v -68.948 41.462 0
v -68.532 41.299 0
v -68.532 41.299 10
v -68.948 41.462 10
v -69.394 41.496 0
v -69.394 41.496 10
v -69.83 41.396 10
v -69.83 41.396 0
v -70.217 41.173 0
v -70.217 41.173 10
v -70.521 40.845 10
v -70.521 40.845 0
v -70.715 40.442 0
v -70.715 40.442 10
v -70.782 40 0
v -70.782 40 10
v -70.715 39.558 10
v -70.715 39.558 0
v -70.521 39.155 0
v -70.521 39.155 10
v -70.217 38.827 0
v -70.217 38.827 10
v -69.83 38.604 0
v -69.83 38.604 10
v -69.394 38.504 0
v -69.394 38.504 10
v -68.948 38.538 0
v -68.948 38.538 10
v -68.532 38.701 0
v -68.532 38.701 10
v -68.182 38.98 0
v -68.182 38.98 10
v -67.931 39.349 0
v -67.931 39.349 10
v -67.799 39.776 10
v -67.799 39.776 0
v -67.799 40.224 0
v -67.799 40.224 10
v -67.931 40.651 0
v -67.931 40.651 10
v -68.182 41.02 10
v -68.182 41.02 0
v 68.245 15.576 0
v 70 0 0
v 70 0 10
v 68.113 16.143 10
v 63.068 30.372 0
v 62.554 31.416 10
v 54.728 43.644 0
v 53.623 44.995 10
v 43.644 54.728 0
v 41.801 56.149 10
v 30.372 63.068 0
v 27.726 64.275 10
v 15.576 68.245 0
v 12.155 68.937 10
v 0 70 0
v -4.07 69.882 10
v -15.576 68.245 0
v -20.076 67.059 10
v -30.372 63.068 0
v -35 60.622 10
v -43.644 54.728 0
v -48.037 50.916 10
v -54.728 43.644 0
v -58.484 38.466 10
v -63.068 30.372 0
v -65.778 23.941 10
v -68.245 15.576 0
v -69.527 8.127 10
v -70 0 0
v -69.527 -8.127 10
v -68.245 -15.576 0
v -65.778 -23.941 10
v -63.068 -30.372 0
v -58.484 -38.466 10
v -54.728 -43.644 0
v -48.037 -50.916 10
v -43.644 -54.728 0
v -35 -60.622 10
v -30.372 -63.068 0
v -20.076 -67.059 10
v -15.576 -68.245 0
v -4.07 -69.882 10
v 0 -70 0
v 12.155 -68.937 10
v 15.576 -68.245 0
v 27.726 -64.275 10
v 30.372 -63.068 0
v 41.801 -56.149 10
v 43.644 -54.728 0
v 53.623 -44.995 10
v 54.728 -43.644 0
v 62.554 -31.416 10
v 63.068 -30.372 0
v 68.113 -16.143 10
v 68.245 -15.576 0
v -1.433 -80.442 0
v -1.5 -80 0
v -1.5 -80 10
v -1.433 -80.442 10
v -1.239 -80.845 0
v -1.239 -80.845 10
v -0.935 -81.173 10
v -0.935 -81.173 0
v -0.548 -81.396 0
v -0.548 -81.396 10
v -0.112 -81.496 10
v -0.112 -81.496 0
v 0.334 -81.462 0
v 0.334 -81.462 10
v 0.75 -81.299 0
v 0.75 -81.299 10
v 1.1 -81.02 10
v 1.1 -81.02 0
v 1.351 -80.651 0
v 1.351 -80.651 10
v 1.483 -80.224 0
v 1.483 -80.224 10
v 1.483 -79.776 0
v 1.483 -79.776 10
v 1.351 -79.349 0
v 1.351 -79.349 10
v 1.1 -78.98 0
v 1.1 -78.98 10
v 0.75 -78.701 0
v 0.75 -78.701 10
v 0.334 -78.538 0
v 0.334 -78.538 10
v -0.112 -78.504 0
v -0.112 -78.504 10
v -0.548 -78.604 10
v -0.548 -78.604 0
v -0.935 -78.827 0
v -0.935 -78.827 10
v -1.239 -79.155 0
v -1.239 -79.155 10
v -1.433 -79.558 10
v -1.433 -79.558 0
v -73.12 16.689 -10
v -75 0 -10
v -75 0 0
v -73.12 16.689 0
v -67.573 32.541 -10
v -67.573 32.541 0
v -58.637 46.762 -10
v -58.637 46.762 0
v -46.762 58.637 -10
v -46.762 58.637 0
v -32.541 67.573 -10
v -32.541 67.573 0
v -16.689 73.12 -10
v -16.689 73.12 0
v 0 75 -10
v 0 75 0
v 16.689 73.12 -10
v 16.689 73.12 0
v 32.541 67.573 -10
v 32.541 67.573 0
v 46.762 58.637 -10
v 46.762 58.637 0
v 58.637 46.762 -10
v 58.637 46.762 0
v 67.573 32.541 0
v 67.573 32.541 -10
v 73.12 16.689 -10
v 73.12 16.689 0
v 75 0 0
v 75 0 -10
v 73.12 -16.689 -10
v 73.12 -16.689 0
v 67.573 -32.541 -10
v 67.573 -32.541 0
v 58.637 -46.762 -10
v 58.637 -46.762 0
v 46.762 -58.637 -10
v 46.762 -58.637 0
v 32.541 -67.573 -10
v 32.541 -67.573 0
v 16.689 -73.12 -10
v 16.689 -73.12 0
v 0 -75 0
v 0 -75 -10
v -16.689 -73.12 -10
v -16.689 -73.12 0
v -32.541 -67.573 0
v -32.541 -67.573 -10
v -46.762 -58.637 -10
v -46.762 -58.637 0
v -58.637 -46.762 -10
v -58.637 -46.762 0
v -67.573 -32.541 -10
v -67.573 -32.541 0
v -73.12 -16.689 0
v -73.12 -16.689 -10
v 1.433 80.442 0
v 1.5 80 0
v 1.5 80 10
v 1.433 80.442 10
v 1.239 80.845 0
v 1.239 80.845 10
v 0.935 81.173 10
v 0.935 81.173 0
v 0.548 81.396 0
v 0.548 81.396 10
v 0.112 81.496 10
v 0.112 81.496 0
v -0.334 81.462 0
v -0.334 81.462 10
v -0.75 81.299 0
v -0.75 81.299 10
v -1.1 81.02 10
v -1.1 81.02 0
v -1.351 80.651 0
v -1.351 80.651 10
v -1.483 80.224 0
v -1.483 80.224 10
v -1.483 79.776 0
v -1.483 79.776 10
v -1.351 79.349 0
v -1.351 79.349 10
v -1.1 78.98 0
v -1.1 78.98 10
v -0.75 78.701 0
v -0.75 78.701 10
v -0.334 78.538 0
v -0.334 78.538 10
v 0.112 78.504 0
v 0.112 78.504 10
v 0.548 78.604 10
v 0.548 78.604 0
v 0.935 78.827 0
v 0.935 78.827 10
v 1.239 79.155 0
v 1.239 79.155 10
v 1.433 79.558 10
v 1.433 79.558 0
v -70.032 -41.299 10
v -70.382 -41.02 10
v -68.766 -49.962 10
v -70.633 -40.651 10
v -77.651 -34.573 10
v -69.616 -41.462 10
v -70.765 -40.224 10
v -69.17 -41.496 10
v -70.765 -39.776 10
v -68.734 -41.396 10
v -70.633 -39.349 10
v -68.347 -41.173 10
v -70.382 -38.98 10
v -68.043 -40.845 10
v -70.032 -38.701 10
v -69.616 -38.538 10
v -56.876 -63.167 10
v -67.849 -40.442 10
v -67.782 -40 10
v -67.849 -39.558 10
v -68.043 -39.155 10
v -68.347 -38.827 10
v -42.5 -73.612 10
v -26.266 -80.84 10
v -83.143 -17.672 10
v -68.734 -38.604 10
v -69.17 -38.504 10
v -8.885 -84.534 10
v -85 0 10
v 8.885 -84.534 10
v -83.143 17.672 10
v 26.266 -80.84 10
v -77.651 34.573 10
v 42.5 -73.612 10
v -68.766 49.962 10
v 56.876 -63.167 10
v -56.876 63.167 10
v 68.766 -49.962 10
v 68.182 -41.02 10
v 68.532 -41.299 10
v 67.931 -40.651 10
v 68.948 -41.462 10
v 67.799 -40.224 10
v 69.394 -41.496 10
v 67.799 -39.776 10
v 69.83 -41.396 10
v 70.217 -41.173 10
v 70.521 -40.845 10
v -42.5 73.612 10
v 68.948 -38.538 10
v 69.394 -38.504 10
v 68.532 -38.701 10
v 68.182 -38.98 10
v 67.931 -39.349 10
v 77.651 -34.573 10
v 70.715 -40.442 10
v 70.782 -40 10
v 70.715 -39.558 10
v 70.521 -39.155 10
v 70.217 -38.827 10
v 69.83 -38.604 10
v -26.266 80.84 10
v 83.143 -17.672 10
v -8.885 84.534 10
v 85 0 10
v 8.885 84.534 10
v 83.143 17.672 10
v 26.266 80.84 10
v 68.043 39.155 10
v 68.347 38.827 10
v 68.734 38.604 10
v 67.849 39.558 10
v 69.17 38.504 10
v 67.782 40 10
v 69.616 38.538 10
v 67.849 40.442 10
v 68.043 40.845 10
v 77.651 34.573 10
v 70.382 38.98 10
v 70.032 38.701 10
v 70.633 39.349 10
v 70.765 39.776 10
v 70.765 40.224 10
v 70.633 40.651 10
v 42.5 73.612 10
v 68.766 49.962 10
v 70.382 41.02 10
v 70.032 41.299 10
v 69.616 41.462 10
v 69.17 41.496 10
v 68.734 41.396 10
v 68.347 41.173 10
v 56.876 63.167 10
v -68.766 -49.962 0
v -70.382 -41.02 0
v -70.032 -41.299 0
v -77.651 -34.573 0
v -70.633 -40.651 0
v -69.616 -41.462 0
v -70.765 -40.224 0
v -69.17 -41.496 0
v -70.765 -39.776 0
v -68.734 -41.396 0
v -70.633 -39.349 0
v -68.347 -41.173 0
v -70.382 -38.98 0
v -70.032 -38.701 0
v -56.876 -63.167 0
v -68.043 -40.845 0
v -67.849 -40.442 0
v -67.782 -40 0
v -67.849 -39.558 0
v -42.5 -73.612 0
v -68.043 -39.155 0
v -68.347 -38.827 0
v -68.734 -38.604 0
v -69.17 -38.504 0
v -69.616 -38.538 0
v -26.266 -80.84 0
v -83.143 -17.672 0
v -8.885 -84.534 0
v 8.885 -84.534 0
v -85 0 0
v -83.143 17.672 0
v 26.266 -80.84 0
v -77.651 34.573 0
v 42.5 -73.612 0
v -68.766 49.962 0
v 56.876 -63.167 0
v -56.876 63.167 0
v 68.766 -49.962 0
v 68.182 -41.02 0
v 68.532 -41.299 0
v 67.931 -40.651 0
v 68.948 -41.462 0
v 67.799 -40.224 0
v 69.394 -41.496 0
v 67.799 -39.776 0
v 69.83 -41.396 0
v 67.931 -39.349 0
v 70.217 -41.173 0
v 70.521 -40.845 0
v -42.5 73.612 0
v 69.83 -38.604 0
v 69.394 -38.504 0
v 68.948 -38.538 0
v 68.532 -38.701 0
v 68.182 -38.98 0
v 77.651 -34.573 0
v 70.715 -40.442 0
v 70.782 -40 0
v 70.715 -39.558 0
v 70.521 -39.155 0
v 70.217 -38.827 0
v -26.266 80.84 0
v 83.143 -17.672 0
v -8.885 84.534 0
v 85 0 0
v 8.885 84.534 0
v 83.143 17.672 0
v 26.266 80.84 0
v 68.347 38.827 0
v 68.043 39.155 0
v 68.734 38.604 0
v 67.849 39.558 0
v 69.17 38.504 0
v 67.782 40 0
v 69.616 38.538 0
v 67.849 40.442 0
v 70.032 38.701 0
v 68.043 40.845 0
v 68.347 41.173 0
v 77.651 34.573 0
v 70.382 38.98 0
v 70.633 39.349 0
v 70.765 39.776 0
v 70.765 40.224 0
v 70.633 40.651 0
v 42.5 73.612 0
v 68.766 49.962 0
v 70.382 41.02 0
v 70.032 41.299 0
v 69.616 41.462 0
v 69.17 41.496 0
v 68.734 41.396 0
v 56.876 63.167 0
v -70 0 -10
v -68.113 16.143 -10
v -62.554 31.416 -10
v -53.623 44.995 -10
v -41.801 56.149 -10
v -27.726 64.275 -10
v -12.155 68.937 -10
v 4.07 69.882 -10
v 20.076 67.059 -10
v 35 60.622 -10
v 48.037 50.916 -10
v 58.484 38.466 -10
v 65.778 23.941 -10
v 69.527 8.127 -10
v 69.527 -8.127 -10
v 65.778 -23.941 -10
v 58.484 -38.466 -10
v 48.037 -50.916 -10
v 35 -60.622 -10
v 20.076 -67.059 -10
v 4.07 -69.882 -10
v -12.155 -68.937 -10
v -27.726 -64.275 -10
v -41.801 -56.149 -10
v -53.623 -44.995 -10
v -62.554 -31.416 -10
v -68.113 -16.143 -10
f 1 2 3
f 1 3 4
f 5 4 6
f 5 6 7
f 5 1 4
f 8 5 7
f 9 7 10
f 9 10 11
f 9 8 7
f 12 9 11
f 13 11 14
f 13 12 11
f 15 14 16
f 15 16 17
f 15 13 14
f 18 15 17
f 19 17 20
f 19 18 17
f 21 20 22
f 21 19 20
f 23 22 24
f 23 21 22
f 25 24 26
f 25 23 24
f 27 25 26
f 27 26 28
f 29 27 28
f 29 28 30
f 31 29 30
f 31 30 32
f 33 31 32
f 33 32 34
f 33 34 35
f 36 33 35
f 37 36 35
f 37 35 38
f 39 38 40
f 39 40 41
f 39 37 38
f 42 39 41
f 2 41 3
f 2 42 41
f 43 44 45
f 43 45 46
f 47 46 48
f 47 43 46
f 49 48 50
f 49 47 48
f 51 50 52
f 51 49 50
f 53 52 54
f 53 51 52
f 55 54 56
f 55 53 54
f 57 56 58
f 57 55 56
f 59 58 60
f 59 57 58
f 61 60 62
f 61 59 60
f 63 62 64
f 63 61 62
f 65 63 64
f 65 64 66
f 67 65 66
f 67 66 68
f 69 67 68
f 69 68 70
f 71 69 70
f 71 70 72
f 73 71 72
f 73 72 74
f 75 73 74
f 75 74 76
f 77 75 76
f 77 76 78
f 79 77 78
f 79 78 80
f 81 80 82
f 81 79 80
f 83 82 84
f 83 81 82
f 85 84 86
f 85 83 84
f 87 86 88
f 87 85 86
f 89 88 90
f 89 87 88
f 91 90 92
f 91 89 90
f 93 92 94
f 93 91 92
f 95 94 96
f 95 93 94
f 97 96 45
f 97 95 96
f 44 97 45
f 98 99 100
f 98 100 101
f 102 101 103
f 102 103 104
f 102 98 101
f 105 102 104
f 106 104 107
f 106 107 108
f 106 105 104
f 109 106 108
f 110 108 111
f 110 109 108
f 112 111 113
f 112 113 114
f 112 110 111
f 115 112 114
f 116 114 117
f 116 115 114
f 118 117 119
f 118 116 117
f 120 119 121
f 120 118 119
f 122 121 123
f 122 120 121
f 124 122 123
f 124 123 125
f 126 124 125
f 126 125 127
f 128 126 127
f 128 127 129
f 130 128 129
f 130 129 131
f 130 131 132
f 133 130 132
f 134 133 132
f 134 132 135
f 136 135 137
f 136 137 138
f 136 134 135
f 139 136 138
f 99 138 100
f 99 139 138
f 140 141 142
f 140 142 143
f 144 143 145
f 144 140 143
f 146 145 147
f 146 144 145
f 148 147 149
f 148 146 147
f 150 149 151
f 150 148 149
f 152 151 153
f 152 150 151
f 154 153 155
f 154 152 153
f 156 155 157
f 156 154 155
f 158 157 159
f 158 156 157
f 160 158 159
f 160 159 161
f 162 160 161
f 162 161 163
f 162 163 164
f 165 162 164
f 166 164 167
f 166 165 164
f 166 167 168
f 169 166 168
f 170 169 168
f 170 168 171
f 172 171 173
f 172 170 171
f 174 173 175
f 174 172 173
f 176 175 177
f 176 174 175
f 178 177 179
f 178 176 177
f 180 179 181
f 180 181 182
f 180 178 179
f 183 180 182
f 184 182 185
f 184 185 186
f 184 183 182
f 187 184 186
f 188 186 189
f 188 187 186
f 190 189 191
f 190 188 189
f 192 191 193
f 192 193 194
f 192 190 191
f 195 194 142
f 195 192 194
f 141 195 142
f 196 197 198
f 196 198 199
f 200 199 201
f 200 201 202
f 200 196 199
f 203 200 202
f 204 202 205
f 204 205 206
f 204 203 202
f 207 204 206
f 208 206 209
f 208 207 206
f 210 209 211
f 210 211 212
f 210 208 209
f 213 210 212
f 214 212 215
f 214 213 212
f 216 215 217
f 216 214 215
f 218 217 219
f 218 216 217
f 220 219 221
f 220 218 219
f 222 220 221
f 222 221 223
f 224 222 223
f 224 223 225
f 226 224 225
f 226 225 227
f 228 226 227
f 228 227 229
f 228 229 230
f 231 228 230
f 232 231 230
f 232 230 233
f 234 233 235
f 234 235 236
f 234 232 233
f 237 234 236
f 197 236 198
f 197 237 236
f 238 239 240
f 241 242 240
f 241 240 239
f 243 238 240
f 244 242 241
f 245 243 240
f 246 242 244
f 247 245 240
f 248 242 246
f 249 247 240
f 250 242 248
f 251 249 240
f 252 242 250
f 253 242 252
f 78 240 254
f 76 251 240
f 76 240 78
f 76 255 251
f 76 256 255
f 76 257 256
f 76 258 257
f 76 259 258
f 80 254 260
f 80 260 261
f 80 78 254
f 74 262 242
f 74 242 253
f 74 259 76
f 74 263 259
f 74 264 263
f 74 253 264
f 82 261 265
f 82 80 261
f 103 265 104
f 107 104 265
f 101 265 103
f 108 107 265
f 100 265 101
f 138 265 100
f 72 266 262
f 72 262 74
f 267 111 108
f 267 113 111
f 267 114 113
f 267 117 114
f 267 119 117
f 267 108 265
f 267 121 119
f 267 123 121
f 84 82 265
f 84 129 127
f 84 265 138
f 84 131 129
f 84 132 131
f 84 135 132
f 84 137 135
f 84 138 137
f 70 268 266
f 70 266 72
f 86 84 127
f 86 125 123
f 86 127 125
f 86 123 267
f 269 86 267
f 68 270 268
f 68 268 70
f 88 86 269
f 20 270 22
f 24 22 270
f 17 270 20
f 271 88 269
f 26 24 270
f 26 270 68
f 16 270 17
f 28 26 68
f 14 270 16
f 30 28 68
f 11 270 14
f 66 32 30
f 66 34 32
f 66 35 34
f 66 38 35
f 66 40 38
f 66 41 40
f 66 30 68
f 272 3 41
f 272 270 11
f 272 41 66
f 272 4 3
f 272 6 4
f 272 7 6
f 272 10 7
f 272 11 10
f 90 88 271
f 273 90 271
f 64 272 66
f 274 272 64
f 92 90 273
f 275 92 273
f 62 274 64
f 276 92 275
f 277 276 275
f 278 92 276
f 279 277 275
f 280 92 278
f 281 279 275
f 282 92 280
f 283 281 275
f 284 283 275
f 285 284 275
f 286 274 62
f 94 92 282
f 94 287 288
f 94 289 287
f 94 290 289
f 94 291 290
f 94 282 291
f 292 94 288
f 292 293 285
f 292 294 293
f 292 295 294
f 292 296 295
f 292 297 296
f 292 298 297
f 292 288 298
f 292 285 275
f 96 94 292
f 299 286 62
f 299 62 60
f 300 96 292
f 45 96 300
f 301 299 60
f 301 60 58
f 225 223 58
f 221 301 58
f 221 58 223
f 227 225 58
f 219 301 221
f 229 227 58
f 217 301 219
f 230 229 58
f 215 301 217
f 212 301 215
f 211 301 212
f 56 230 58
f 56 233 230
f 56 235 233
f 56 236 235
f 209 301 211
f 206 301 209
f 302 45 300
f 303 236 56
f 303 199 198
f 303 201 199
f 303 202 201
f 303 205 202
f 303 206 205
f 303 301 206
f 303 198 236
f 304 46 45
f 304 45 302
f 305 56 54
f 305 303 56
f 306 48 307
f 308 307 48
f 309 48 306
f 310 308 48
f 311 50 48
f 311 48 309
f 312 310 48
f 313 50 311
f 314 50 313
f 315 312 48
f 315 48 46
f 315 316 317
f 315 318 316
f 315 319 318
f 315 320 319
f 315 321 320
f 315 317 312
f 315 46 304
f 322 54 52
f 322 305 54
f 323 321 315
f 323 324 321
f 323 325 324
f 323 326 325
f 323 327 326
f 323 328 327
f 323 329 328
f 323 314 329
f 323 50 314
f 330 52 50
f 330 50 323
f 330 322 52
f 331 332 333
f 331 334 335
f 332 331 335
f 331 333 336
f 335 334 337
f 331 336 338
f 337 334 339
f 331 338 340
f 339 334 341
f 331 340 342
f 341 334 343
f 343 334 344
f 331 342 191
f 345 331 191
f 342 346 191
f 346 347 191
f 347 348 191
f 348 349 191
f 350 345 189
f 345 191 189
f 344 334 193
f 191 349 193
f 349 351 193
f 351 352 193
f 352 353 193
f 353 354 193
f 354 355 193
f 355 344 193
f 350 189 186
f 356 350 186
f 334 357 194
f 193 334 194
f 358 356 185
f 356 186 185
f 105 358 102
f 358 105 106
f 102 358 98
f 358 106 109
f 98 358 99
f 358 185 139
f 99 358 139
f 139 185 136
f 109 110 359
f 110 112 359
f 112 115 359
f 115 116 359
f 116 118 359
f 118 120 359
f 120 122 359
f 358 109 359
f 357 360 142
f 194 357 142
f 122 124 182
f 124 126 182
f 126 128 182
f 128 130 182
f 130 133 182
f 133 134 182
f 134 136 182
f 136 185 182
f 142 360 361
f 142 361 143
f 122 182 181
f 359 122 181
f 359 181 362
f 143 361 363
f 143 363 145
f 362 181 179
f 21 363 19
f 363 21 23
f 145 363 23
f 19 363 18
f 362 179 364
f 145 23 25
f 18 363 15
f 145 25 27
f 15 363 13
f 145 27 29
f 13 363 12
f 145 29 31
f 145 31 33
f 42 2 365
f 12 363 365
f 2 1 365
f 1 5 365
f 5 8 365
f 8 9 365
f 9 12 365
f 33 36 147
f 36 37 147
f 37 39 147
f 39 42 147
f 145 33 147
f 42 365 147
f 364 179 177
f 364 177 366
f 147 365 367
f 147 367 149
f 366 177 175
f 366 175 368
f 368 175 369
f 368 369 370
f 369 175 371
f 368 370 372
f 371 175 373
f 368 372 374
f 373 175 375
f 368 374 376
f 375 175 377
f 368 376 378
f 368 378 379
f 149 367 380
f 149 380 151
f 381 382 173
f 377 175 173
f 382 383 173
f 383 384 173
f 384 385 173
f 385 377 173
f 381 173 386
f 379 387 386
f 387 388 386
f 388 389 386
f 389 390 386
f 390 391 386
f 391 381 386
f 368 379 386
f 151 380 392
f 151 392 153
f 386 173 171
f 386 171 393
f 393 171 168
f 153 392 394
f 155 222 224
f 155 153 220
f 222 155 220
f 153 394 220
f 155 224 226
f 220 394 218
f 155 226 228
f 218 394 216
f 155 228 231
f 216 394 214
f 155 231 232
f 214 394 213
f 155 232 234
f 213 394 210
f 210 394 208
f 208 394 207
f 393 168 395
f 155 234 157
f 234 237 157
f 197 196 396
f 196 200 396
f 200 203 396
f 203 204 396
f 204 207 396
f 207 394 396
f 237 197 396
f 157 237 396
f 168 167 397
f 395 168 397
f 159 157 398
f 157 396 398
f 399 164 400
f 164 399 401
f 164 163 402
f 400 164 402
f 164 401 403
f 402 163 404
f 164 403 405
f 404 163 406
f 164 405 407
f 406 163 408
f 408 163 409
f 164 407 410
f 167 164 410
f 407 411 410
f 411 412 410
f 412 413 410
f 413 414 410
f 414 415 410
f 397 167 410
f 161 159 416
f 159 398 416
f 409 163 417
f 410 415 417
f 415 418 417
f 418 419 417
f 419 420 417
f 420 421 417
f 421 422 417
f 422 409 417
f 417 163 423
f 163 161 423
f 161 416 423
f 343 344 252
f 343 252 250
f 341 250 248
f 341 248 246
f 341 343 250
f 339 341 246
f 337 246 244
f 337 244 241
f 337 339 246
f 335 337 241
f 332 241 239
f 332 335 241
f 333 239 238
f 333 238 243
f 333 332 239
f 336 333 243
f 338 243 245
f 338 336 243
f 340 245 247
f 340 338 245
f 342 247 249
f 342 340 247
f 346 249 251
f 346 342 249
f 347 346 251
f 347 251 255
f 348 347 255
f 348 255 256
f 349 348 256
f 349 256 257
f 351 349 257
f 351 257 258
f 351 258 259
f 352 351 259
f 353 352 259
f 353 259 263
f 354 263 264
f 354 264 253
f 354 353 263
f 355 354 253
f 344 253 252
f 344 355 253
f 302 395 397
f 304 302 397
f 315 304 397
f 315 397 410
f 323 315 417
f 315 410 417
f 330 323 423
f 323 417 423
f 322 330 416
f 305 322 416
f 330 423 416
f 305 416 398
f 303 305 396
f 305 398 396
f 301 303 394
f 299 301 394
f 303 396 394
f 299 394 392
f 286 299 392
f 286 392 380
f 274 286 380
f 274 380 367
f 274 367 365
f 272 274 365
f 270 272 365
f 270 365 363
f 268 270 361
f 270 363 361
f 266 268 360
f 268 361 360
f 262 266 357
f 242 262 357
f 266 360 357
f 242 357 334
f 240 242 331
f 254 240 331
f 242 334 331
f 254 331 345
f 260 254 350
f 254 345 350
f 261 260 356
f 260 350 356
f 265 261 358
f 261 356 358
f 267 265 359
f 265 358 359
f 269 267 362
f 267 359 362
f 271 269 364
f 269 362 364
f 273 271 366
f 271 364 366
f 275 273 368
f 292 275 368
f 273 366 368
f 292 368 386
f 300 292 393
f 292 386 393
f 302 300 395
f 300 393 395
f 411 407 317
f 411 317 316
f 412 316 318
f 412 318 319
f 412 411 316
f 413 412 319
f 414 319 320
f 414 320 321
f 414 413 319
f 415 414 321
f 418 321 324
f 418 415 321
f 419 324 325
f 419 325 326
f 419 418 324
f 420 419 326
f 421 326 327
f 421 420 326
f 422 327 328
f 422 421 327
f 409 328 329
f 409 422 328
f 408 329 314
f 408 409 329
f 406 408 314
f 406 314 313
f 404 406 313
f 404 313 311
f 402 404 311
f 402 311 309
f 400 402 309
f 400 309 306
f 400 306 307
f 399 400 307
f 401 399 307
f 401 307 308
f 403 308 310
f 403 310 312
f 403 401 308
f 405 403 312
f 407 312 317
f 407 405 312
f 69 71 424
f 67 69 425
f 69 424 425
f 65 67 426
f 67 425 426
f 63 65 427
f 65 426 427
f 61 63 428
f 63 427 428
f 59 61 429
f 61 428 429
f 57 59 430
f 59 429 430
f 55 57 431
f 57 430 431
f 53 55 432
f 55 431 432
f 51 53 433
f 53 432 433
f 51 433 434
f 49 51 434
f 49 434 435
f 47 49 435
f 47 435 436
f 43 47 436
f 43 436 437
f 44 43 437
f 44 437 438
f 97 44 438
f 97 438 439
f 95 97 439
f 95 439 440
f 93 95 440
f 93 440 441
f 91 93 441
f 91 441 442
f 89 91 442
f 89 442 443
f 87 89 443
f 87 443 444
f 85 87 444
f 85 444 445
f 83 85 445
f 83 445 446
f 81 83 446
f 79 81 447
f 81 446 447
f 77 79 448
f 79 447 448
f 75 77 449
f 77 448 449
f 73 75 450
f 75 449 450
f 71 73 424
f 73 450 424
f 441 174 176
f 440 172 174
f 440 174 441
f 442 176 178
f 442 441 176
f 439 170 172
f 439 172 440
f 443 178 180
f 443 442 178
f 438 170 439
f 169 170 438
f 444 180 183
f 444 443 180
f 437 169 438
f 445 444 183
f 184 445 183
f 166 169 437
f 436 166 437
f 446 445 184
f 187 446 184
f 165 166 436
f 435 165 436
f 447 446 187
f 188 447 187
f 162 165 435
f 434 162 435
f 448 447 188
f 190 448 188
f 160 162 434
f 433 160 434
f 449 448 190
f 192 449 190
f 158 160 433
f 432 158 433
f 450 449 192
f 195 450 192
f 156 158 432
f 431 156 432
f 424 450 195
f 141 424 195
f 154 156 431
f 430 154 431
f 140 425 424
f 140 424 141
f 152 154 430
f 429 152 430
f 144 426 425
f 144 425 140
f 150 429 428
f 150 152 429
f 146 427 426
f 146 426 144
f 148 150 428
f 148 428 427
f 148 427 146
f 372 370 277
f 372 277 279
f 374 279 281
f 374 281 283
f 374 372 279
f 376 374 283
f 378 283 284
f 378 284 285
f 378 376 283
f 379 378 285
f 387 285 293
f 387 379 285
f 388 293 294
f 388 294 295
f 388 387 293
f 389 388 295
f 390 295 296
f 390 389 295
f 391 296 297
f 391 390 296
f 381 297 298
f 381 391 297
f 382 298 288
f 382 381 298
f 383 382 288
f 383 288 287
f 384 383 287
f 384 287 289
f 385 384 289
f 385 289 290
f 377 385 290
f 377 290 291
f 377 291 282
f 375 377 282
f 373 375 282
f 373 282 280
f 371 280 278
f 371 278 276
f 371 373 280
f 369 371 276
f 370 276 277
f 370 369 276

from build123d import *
from build123d.topology import SkipClean

# Parameters (mm, degrees)
SKETCH1_R           = 85
SKETCH1_R_2         = 70
BOSS_EXTRUDE1_DEPTH = 10
SKETCH2_R           = 1.5
CUT_EXTRUDE1_DEPTH  = 10
CIRPATTERN1_COUNT   = 6
BOSS_EXTRUDE2_START = 10
SKETCH3_R           = 75
SKETCH3_R_2         = 70
BOSS_EXTRUDE2_DEPTH = 10


with BuildPart() as part:
    # Sketch1 → Boss-Extrude1 (new body)
    with BuildSketch(Plane.XY):
        Circle(SKETCH1_R)
        Circle(SKETCH1_R_2, mode=Mode.SUBTRACT)
    extrude(amount=BOSS_EXTRUDE1_DEPTH)

    # Sketch2 → Cut-Extrude1 (cut)
    with BuildSketch(Plane.XY):
        with Locations((0, 80)):
            Circle(SKETCH2_R)
    cut_extrude1 = extrude(amount=CUT_EXTRUDE1_DEPTH, mode=Mode.SUBTRACT)

    # CirPattern1: Cut-Extrude1 ×6 about axis
    cirpattern1_axis = Axis((0, 0, 0), (0, 0, 1))
    for i in range(1, CIRPATTERN1_COUNT):
        add(cut_extrude1.rotate(cirpattern1_axis, i * 360 / CIRPATTERN1_COUNT), mode=Mode.SUBTRACT)

    # Sketch3 → Boss-Extrude2 (add)
    with SkipClean():  # the faces are left unmerged after this step: merging them gives an invalid solid
        with BuildSketch(Plane(origin=(0, 0, 0), x_dir=(-1, 0, 0), z_dir=(0, 0, -1)).offset(BOSS_EXTRUDE2_START)):
            Circle(SKETCH3_R)
            Circle(SKETCH3_R_2, mode=Mode.SUBTRACT)
        extrude(amount=-BOSS_EXTRUDE2_DEPTH)


solid = part.part
